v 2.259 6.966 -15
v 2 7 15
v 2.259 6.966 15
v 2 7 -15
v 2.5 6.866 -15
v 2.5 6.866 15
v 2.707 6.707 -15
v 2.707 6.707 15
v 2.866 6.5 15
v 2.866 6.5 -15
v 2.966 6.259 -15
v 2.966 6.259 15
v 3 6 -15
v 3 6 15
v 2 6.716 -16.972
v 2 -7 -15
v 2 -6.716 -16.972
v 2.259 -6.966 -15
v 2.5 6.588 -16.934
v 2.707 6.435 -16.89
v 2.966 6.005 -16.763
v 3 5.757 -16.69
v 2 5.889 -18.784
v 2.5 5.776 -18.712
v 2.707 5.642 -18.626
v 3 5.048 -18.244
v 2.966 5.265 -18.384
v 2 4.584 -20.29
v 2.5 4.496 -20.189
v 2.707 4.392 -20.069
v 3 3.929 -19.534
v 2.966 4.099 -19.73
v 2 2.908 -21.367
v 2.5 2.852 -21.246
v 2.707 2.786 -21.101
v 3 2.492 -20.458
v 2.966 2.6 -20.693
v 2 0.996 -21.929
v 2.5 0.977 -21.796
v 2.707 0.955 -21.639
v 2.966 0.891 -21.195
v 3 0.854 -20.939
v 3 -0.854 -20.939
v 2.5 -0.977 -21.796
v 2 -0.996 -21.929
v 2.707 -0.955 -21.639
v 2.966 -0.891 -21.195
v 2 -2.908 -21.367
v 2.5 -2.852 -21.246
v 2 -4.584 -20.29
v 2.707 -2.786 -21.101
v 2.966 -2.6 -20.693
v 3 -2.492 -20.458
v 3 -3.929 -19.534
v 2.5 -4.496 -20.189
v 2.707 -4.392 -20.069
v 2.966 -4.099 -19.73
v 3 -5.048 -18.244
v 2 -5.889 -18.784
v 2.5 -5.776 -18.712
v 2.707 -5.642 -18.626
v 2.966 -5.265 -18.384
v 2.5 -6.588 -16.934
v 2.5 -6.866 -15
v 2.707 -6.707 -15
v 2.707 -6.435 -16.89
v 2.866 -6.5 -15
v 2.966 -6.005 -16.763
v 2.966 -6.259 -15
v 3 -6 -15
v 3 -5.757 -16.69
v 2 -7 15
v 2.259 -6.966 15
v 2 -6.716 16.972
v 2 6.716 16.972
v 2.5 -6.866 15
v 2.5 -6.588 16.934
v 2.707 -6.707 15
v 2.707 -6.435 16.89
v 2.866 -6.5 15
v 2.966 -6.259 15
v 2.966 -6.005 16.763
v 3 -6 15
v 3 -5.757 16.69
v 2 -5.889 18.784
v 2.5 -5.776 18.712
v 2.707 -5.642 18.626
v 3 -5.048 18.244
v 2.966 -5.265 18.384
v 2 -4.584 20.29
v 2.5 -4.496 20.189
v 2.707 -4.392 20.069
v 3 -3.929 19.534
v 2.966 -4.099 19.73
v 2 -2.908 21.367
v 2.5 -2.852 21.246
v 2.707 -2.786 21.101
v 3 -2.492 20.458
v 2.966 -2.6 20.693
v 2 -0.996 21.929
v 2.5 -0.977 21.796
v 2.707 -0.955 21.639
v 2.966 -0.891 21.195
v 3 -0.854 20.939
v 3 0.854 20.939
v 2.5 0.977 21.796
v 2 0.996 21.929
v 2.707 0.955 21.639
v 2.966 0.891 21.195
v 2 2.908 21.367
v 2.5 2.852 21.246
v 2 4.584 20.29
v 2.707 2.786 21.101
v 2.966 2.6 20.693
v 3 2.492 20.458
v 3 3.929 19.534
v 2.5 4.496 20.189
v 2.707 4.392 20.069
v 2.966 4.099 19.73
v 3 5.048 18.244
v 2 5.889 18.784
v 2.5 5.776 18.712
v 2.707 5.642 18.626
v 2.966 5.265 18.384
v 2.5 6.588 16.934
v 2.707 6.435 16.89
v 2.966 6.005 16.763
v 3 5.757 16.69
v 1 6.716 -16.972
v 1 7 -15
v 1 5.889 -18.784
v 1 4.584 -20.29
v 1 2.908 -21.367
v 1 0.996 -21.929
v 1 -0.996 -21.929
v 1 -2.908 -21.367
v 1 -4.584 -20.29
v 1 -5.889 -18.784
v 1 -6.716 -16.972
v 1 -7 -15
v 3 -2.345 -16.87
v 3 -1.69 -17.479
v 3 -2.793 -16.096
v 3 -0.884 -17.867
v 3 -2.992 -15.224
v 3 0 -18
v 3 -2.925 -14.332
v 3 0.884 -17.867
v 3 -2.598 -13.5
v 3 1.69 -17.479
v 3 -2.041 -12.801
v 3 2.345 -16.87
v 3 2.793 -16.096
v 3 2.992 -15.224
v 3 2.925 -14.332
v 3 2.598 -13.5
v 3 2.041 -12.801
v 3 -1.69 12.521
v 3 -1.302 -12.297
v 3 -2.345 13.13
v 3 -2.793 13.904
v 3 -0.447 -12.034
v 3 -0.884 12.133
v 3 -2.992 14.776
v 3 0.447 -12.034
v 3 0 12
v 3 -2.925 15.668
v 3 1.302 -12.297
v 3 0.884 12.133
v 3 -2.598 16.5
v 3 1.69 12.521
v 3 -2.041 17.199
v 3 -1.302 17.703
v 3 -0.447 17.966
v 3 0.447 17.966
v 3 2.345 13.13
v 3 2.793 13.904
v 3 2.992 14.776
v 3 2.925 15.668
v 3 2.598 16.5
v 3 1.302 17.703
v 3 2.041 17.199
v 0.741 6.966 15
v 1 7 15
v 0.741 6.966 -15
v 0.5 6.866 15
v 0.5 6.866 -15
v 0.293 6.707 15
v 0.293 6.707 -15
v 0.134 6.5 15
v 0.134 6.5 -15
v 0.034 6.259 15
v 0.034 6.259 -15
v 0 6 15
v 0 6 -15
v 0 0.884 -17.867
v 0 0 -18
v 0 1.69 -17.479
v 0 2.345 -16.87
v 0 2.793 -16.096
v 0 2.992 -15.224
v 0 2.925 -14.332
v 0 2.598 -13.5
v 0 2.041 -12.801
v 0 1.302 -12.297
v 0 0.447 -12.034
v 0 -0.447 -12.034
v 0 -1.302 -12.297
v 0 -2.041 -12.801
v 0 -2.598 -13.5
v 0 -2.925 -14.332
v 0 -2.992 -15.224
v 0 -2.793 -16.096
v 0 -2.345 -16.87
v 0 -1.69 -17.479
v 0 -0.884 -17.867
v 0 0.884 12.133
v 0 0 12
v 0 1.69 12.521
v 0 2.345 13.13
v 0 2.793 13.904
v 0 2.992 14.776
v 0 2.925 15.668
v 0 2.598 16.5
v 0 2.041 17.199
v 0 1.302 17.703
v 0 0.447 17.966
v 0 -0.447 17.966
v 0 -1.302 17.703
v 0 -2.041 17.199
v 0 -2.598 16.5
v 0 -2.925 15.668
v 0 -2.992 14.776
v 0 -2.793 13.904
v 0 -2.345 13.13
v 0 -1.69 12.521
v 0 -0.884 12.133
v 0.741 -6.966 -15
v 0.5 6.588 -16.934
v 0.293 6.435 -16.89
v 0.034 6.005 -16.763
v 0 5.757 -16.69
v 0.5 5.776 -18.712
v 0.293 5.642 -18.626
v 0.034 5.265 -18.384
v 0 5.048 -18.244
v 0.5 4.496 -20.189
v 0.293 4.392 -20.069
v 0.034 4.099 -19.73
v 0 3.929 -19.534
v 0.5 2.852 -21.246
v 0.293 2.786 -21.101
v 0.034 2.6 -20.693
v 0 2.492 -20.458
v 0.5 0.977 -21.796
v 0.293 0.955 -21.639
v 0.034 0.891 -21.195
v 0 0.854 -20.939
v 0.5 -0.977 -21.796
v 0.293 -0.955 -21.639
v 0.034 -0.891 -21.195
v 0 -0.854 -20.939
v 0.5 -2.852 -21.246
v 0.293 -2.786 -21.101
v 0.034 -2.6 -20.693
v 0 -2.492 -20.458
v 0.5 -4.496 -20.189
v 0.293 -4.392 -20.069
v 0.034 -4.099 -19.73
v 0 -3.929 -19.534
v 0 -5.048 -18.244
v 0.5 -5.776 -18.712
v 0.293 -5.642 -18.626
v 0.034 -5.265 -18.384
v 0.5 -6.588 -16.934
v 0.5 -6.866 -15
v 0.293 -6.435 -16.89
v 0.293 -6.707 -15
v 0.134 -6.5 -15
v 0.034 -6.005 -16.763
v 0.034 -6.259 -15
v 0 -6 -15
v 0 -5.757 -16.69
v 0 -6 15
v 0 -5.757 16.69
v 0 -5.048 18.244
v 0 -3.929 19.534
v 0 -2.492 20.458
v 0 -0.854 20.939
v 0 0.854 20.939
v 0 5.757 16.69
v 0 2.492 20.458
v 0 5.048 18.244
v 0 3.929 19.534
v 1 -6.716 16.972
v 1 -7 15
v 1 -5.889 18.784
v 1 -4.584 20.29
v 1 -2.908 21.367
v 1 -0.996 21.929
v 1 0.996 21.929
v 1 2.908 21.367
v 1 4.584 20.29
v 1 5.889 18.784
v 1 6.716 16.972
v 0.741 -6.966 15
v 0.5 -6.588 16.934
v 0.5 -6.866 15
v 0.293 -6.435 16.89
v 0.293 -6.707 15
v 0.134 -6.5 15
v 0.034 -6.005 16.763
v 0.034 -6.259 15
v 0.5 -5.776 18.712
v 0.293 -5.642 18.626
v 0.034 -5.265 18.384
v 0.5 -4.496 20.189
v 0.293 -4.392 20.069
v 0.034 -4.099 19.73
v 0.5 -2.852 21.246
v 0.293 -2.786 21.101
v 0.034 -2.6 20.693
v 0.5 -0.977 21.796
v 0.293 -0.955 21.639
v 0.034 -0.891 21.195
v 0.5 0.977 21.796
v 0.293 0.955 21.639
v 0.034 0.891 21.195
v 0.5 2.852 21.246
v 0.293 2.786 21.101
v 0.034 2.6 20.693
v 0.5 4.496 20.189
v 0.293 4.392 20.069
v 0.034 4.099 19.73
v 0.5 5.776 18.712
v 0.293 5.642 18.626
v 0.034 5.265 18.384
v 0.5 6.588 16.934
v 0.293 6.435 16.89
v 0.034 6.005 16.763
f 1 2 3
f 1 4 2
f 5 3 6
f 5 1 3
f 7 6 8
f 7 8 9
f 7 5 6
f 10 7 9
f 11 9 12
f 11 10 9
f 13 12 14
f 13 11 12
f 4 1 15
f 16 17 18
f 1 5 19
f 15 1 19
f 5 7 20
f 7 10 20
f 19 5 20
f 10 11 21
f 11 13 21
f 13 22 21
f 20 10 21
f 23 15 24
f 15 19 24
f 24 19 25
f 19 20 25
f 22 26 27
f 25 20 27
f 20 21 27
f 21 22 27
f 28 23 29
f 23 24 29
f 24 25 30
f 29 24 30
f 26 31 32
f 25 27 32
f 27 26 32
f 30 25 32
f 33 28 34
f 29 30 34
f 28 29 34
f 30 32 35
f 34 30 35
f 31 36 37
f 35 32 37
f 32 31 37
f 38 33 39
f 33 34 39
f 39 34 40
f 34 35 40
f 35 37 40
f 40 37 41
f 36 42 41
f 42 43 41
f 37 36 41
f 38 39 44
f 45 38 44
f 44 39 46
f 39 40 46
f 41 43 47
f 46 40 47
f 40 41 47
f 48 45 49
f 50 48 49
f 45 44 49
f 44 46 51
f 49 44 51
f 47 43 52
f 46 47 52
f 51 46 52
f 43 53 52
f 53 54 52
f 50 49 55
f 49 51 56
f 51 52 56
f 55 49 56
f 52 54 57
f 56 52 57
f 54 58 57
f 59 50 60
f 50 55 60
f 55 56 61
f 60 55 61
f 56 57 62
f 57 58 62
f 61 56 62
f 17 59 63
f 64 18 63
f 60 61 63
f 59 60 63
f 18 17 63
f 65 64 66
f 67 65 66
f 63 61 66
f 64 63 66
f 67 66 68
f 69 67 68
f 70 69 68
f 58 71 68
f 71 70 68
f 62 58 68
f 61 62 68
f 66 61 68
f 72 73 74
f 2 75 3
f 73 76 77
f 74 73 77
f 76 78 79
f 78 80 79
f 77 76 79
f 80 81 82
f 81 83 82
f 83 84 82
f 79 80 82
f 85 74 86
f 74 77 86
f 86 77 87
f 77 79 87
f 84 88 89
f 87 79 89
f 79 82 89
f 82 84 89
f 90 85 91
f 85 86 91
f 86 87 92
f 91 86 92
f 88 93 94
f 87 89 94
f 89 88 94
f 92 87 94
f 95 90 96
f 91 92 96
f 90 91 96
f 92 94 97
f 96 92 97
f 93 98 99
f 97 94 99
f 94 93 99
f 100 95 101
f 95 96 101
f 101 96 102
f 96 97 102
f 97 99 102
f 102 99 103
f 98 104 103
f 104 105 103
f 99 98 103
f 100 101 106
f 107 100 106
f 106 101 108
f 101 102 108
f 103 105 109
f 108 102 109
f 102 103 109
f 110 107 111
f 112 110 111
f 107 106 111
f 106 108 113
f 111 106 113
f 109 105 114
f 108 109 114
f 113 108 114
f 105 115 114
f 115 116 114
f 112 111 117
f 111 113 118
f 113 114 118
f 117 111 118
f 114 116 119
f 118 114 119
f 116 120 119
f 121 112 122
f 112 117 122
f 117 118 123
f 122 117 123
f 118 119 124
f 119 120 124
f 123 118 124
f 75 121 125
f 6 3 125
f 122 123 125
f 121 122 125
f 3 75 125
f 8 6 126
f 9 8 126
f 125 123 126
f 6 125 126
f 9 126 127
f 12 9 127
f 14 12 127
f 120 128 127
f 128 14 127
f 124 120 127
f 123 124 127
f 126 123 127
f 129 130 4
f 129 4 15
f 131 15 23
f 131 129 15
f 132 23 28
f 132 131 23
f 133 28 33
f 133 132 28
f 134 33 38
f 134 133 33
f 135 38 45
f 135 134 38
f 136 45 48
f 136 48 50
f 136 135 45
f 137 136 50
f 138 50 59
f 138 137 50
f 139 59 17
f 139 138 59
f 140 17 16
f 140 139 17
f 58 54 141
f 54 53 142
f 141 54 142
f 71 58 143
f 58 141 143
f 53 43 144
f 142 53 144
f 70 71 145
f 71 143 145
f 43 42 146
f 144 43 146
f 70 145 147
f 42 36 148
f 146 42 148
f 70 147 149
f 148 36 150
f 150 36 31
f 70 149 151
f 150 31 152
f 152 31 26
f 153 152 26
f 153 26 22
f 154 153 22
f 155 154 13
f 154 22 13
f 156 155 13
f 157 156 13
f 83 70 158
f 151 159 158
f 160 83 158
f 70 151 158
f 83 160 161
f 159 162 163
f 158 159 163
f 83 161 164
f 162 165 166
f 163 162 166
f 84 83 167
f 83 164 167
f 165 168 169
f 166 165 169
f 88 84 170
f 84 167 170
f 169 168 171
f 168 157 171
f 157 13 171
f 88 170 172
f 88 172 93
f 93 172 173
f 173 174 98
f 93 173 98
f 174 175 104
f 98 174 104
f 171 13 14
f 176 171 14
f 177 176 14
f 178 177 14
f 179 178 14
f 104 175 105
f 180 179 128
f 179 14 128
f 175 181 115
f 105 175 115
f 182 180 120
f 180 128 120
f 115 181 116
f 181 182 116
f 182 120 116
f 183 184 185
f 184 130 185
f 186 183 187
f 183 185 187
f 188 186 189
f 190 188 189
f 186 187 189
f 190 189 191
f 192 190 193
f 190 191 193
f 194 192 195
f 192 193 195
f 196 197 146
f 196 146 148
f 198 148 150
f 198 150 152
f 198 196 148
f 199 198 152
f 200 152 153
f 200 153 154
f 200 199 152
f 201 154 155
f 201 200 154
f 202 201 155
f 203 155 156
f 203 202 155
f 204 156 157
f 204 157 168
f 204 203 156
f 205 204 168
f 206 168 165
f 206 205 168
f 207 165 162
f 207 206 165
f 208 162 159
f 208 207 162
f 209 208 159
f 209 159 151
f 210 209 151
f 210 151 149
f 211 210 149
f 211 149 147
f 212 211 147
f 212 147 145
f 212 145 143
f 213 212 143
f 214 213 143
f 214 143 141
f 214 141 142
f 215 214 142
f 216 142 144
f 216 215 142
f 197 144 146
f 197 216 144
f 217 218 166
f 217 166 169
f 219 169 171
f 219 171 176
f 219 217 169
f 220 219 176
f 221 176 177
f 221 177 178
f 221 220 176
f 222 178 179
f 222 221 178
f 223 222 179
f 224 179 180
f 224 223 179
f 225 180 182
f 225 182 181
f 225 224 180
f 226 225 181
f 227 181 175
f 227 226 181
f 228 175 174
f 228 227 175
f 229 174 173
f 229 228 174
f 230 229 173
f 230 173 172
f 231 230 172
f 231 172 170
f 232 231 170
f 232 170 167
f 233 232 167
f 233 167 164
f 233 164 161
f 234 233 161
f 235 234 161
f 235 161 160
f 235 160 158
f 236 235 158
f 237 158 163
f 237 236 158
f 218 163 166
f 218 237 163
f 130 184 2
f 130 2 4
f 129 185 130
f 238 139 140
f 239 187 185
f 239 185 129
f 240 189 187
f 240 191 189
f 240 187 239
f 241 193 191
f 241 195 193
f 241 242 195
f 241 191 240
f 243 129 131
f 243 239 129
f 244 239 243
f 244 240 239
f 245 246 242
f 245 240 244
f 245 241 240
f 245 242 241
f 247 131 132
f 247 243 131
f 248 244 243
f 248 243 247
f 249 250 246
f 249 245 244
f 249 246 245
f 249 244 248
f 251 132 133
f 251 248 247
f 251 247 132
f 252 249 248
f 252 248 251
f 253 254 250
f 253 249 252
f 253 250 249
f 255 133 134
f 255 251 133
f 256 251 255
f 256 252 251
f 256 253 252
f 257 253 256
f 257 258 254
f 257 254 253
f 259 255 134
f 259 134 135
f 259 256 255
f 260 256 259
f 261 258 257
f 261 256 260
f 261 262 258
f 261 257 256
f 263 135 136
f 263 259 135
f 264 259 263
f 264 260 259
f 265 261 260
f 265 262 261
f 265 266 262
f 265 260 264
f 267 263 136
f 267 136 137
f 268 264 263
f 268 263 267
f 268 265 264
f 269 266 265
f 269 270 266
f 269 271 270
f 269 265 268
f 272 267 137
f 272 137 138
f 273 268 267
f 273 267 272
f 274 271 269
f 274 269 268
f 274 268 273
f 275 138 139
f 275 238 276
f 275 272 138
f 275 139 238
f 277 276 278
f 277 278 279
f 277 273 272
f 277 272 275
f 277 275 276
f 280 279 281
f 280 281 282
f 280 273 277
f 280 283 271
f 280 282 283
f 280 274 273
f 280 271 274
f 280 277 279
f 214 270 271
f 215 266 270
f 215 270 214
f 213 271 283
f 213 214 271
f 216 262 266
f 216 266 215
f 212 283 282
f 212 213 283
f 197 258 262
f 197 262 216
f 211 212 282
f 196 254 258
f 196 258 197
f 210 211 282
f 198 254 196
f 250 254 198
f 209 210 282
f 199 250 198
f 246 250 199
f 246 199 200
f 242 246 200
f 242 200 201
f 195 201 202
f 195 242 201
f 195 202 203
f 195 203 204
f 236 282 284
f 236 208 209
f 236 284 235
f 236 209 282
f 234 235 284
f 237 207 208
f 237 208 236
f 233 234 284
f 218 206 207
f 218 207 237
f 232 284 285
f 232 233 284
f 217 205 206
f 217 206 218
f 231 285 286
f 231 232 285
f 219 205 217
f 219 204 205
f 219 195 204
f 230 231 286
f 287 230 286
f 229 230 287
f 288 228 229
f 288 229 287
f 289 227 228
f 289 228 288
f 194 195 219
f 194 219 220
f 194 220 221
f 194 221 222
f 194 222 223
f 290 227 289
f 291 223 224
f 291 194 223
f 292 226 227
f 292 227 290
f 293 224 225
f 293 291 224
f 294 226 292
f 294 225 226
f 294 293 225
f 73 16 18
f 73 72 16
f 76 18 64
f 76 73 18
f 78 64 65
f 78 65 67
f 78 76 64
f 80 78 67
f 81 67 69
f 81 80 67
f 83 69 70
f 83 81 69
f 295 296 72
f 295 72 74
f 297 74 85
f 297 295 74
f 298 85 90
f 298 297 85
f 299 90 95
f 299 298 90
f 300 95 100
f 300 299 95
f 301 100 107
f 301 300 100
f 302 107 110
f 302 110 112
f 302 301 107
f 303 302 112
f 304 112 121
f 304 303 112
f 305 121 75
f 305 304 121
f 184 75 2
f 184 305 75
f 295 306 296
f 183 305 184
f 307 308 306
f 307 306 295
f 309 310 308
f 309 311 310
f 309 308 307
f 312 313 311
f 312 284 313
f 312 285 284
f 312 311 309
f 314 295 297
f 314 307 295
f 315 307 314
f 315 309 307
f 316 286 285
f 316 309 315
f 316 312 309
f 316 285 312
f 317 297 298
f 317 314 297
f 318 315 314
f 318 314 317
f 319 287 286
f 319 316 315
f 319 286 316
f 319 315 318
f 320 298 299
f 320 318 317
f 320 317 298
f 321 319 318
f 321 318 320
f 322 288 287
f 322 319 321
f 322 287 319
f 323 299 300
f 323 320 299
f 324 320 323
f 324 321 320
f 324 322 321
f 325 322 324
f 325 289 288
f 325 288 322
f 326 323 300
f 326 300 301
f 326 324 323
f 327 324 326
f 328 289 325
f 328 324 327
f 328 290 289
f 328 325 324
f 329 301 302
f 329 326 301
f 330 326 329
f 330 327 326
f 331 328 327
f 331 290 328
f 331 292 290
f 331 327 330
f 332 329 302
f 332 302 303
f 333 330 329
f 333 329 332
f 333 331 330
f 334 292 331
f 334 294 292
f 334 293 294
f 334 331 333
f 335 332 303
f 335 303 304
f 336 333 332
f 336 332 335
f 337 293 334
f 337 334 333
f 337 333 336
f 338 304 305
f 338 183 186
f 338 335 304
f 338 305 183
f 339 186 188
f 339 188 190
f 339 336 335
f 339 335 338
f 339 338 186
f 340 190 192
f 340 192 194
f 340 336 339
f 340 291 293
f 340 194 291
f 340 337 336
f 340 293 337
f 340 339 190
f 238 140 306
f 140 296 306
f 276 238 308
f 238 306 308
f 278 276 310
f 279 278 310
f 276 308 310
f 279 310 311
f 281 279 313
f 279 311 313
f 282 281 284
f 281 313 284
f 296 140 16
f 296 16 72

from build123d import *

# Parameters (mm, degrees)
SKETCH_1_R      = 3
EXTRUDE_1_DEPTH = 3
FILLET_1_R      = 1


with BuildPart() as part:
    # 草图1 → 凸台-拉伸1 (new body)
    with BuildSketch(Plane(origin=(0, 0, 0), x_dir=(0, 0, -1), z_dir=(1, 0, 0))):
        with BuildLine():
            Line((-15, 7), (15, 7))
            ThreePointArc((15, 7), (22, 0), (15, -7))
            Line((15, -7), (-15, -7))
            ThreePointArc((-15, -7), (-22, 0), (-15, 7))
        make_face()
        with Locations((-15, 0)):
            Circle(SKETCH_1_R, mode=Mode.SUBTRACT)
        with Locations((15, 0)):
            Circle(SKETCH_1_R, mode=Mode.SUBTRACT)
    extrude(amount=EXTRUDE_1_DEPTH)

    # 圆角1
    fillet_1_edges = [part.edges().sort_by_distance(p)[0] for p in [
        (3, 0, -22),
        (3, 7, 0),
        (3, 0, 22),
        (0, 7, 0),
        (0, 0, -22),
        (0, -7, 0),
        (0, 0, 22),
        (3, -7, 0),
    ]]
    fillet(fillet_1_edges, radius=FILLET_1_R)


solid = part.part
